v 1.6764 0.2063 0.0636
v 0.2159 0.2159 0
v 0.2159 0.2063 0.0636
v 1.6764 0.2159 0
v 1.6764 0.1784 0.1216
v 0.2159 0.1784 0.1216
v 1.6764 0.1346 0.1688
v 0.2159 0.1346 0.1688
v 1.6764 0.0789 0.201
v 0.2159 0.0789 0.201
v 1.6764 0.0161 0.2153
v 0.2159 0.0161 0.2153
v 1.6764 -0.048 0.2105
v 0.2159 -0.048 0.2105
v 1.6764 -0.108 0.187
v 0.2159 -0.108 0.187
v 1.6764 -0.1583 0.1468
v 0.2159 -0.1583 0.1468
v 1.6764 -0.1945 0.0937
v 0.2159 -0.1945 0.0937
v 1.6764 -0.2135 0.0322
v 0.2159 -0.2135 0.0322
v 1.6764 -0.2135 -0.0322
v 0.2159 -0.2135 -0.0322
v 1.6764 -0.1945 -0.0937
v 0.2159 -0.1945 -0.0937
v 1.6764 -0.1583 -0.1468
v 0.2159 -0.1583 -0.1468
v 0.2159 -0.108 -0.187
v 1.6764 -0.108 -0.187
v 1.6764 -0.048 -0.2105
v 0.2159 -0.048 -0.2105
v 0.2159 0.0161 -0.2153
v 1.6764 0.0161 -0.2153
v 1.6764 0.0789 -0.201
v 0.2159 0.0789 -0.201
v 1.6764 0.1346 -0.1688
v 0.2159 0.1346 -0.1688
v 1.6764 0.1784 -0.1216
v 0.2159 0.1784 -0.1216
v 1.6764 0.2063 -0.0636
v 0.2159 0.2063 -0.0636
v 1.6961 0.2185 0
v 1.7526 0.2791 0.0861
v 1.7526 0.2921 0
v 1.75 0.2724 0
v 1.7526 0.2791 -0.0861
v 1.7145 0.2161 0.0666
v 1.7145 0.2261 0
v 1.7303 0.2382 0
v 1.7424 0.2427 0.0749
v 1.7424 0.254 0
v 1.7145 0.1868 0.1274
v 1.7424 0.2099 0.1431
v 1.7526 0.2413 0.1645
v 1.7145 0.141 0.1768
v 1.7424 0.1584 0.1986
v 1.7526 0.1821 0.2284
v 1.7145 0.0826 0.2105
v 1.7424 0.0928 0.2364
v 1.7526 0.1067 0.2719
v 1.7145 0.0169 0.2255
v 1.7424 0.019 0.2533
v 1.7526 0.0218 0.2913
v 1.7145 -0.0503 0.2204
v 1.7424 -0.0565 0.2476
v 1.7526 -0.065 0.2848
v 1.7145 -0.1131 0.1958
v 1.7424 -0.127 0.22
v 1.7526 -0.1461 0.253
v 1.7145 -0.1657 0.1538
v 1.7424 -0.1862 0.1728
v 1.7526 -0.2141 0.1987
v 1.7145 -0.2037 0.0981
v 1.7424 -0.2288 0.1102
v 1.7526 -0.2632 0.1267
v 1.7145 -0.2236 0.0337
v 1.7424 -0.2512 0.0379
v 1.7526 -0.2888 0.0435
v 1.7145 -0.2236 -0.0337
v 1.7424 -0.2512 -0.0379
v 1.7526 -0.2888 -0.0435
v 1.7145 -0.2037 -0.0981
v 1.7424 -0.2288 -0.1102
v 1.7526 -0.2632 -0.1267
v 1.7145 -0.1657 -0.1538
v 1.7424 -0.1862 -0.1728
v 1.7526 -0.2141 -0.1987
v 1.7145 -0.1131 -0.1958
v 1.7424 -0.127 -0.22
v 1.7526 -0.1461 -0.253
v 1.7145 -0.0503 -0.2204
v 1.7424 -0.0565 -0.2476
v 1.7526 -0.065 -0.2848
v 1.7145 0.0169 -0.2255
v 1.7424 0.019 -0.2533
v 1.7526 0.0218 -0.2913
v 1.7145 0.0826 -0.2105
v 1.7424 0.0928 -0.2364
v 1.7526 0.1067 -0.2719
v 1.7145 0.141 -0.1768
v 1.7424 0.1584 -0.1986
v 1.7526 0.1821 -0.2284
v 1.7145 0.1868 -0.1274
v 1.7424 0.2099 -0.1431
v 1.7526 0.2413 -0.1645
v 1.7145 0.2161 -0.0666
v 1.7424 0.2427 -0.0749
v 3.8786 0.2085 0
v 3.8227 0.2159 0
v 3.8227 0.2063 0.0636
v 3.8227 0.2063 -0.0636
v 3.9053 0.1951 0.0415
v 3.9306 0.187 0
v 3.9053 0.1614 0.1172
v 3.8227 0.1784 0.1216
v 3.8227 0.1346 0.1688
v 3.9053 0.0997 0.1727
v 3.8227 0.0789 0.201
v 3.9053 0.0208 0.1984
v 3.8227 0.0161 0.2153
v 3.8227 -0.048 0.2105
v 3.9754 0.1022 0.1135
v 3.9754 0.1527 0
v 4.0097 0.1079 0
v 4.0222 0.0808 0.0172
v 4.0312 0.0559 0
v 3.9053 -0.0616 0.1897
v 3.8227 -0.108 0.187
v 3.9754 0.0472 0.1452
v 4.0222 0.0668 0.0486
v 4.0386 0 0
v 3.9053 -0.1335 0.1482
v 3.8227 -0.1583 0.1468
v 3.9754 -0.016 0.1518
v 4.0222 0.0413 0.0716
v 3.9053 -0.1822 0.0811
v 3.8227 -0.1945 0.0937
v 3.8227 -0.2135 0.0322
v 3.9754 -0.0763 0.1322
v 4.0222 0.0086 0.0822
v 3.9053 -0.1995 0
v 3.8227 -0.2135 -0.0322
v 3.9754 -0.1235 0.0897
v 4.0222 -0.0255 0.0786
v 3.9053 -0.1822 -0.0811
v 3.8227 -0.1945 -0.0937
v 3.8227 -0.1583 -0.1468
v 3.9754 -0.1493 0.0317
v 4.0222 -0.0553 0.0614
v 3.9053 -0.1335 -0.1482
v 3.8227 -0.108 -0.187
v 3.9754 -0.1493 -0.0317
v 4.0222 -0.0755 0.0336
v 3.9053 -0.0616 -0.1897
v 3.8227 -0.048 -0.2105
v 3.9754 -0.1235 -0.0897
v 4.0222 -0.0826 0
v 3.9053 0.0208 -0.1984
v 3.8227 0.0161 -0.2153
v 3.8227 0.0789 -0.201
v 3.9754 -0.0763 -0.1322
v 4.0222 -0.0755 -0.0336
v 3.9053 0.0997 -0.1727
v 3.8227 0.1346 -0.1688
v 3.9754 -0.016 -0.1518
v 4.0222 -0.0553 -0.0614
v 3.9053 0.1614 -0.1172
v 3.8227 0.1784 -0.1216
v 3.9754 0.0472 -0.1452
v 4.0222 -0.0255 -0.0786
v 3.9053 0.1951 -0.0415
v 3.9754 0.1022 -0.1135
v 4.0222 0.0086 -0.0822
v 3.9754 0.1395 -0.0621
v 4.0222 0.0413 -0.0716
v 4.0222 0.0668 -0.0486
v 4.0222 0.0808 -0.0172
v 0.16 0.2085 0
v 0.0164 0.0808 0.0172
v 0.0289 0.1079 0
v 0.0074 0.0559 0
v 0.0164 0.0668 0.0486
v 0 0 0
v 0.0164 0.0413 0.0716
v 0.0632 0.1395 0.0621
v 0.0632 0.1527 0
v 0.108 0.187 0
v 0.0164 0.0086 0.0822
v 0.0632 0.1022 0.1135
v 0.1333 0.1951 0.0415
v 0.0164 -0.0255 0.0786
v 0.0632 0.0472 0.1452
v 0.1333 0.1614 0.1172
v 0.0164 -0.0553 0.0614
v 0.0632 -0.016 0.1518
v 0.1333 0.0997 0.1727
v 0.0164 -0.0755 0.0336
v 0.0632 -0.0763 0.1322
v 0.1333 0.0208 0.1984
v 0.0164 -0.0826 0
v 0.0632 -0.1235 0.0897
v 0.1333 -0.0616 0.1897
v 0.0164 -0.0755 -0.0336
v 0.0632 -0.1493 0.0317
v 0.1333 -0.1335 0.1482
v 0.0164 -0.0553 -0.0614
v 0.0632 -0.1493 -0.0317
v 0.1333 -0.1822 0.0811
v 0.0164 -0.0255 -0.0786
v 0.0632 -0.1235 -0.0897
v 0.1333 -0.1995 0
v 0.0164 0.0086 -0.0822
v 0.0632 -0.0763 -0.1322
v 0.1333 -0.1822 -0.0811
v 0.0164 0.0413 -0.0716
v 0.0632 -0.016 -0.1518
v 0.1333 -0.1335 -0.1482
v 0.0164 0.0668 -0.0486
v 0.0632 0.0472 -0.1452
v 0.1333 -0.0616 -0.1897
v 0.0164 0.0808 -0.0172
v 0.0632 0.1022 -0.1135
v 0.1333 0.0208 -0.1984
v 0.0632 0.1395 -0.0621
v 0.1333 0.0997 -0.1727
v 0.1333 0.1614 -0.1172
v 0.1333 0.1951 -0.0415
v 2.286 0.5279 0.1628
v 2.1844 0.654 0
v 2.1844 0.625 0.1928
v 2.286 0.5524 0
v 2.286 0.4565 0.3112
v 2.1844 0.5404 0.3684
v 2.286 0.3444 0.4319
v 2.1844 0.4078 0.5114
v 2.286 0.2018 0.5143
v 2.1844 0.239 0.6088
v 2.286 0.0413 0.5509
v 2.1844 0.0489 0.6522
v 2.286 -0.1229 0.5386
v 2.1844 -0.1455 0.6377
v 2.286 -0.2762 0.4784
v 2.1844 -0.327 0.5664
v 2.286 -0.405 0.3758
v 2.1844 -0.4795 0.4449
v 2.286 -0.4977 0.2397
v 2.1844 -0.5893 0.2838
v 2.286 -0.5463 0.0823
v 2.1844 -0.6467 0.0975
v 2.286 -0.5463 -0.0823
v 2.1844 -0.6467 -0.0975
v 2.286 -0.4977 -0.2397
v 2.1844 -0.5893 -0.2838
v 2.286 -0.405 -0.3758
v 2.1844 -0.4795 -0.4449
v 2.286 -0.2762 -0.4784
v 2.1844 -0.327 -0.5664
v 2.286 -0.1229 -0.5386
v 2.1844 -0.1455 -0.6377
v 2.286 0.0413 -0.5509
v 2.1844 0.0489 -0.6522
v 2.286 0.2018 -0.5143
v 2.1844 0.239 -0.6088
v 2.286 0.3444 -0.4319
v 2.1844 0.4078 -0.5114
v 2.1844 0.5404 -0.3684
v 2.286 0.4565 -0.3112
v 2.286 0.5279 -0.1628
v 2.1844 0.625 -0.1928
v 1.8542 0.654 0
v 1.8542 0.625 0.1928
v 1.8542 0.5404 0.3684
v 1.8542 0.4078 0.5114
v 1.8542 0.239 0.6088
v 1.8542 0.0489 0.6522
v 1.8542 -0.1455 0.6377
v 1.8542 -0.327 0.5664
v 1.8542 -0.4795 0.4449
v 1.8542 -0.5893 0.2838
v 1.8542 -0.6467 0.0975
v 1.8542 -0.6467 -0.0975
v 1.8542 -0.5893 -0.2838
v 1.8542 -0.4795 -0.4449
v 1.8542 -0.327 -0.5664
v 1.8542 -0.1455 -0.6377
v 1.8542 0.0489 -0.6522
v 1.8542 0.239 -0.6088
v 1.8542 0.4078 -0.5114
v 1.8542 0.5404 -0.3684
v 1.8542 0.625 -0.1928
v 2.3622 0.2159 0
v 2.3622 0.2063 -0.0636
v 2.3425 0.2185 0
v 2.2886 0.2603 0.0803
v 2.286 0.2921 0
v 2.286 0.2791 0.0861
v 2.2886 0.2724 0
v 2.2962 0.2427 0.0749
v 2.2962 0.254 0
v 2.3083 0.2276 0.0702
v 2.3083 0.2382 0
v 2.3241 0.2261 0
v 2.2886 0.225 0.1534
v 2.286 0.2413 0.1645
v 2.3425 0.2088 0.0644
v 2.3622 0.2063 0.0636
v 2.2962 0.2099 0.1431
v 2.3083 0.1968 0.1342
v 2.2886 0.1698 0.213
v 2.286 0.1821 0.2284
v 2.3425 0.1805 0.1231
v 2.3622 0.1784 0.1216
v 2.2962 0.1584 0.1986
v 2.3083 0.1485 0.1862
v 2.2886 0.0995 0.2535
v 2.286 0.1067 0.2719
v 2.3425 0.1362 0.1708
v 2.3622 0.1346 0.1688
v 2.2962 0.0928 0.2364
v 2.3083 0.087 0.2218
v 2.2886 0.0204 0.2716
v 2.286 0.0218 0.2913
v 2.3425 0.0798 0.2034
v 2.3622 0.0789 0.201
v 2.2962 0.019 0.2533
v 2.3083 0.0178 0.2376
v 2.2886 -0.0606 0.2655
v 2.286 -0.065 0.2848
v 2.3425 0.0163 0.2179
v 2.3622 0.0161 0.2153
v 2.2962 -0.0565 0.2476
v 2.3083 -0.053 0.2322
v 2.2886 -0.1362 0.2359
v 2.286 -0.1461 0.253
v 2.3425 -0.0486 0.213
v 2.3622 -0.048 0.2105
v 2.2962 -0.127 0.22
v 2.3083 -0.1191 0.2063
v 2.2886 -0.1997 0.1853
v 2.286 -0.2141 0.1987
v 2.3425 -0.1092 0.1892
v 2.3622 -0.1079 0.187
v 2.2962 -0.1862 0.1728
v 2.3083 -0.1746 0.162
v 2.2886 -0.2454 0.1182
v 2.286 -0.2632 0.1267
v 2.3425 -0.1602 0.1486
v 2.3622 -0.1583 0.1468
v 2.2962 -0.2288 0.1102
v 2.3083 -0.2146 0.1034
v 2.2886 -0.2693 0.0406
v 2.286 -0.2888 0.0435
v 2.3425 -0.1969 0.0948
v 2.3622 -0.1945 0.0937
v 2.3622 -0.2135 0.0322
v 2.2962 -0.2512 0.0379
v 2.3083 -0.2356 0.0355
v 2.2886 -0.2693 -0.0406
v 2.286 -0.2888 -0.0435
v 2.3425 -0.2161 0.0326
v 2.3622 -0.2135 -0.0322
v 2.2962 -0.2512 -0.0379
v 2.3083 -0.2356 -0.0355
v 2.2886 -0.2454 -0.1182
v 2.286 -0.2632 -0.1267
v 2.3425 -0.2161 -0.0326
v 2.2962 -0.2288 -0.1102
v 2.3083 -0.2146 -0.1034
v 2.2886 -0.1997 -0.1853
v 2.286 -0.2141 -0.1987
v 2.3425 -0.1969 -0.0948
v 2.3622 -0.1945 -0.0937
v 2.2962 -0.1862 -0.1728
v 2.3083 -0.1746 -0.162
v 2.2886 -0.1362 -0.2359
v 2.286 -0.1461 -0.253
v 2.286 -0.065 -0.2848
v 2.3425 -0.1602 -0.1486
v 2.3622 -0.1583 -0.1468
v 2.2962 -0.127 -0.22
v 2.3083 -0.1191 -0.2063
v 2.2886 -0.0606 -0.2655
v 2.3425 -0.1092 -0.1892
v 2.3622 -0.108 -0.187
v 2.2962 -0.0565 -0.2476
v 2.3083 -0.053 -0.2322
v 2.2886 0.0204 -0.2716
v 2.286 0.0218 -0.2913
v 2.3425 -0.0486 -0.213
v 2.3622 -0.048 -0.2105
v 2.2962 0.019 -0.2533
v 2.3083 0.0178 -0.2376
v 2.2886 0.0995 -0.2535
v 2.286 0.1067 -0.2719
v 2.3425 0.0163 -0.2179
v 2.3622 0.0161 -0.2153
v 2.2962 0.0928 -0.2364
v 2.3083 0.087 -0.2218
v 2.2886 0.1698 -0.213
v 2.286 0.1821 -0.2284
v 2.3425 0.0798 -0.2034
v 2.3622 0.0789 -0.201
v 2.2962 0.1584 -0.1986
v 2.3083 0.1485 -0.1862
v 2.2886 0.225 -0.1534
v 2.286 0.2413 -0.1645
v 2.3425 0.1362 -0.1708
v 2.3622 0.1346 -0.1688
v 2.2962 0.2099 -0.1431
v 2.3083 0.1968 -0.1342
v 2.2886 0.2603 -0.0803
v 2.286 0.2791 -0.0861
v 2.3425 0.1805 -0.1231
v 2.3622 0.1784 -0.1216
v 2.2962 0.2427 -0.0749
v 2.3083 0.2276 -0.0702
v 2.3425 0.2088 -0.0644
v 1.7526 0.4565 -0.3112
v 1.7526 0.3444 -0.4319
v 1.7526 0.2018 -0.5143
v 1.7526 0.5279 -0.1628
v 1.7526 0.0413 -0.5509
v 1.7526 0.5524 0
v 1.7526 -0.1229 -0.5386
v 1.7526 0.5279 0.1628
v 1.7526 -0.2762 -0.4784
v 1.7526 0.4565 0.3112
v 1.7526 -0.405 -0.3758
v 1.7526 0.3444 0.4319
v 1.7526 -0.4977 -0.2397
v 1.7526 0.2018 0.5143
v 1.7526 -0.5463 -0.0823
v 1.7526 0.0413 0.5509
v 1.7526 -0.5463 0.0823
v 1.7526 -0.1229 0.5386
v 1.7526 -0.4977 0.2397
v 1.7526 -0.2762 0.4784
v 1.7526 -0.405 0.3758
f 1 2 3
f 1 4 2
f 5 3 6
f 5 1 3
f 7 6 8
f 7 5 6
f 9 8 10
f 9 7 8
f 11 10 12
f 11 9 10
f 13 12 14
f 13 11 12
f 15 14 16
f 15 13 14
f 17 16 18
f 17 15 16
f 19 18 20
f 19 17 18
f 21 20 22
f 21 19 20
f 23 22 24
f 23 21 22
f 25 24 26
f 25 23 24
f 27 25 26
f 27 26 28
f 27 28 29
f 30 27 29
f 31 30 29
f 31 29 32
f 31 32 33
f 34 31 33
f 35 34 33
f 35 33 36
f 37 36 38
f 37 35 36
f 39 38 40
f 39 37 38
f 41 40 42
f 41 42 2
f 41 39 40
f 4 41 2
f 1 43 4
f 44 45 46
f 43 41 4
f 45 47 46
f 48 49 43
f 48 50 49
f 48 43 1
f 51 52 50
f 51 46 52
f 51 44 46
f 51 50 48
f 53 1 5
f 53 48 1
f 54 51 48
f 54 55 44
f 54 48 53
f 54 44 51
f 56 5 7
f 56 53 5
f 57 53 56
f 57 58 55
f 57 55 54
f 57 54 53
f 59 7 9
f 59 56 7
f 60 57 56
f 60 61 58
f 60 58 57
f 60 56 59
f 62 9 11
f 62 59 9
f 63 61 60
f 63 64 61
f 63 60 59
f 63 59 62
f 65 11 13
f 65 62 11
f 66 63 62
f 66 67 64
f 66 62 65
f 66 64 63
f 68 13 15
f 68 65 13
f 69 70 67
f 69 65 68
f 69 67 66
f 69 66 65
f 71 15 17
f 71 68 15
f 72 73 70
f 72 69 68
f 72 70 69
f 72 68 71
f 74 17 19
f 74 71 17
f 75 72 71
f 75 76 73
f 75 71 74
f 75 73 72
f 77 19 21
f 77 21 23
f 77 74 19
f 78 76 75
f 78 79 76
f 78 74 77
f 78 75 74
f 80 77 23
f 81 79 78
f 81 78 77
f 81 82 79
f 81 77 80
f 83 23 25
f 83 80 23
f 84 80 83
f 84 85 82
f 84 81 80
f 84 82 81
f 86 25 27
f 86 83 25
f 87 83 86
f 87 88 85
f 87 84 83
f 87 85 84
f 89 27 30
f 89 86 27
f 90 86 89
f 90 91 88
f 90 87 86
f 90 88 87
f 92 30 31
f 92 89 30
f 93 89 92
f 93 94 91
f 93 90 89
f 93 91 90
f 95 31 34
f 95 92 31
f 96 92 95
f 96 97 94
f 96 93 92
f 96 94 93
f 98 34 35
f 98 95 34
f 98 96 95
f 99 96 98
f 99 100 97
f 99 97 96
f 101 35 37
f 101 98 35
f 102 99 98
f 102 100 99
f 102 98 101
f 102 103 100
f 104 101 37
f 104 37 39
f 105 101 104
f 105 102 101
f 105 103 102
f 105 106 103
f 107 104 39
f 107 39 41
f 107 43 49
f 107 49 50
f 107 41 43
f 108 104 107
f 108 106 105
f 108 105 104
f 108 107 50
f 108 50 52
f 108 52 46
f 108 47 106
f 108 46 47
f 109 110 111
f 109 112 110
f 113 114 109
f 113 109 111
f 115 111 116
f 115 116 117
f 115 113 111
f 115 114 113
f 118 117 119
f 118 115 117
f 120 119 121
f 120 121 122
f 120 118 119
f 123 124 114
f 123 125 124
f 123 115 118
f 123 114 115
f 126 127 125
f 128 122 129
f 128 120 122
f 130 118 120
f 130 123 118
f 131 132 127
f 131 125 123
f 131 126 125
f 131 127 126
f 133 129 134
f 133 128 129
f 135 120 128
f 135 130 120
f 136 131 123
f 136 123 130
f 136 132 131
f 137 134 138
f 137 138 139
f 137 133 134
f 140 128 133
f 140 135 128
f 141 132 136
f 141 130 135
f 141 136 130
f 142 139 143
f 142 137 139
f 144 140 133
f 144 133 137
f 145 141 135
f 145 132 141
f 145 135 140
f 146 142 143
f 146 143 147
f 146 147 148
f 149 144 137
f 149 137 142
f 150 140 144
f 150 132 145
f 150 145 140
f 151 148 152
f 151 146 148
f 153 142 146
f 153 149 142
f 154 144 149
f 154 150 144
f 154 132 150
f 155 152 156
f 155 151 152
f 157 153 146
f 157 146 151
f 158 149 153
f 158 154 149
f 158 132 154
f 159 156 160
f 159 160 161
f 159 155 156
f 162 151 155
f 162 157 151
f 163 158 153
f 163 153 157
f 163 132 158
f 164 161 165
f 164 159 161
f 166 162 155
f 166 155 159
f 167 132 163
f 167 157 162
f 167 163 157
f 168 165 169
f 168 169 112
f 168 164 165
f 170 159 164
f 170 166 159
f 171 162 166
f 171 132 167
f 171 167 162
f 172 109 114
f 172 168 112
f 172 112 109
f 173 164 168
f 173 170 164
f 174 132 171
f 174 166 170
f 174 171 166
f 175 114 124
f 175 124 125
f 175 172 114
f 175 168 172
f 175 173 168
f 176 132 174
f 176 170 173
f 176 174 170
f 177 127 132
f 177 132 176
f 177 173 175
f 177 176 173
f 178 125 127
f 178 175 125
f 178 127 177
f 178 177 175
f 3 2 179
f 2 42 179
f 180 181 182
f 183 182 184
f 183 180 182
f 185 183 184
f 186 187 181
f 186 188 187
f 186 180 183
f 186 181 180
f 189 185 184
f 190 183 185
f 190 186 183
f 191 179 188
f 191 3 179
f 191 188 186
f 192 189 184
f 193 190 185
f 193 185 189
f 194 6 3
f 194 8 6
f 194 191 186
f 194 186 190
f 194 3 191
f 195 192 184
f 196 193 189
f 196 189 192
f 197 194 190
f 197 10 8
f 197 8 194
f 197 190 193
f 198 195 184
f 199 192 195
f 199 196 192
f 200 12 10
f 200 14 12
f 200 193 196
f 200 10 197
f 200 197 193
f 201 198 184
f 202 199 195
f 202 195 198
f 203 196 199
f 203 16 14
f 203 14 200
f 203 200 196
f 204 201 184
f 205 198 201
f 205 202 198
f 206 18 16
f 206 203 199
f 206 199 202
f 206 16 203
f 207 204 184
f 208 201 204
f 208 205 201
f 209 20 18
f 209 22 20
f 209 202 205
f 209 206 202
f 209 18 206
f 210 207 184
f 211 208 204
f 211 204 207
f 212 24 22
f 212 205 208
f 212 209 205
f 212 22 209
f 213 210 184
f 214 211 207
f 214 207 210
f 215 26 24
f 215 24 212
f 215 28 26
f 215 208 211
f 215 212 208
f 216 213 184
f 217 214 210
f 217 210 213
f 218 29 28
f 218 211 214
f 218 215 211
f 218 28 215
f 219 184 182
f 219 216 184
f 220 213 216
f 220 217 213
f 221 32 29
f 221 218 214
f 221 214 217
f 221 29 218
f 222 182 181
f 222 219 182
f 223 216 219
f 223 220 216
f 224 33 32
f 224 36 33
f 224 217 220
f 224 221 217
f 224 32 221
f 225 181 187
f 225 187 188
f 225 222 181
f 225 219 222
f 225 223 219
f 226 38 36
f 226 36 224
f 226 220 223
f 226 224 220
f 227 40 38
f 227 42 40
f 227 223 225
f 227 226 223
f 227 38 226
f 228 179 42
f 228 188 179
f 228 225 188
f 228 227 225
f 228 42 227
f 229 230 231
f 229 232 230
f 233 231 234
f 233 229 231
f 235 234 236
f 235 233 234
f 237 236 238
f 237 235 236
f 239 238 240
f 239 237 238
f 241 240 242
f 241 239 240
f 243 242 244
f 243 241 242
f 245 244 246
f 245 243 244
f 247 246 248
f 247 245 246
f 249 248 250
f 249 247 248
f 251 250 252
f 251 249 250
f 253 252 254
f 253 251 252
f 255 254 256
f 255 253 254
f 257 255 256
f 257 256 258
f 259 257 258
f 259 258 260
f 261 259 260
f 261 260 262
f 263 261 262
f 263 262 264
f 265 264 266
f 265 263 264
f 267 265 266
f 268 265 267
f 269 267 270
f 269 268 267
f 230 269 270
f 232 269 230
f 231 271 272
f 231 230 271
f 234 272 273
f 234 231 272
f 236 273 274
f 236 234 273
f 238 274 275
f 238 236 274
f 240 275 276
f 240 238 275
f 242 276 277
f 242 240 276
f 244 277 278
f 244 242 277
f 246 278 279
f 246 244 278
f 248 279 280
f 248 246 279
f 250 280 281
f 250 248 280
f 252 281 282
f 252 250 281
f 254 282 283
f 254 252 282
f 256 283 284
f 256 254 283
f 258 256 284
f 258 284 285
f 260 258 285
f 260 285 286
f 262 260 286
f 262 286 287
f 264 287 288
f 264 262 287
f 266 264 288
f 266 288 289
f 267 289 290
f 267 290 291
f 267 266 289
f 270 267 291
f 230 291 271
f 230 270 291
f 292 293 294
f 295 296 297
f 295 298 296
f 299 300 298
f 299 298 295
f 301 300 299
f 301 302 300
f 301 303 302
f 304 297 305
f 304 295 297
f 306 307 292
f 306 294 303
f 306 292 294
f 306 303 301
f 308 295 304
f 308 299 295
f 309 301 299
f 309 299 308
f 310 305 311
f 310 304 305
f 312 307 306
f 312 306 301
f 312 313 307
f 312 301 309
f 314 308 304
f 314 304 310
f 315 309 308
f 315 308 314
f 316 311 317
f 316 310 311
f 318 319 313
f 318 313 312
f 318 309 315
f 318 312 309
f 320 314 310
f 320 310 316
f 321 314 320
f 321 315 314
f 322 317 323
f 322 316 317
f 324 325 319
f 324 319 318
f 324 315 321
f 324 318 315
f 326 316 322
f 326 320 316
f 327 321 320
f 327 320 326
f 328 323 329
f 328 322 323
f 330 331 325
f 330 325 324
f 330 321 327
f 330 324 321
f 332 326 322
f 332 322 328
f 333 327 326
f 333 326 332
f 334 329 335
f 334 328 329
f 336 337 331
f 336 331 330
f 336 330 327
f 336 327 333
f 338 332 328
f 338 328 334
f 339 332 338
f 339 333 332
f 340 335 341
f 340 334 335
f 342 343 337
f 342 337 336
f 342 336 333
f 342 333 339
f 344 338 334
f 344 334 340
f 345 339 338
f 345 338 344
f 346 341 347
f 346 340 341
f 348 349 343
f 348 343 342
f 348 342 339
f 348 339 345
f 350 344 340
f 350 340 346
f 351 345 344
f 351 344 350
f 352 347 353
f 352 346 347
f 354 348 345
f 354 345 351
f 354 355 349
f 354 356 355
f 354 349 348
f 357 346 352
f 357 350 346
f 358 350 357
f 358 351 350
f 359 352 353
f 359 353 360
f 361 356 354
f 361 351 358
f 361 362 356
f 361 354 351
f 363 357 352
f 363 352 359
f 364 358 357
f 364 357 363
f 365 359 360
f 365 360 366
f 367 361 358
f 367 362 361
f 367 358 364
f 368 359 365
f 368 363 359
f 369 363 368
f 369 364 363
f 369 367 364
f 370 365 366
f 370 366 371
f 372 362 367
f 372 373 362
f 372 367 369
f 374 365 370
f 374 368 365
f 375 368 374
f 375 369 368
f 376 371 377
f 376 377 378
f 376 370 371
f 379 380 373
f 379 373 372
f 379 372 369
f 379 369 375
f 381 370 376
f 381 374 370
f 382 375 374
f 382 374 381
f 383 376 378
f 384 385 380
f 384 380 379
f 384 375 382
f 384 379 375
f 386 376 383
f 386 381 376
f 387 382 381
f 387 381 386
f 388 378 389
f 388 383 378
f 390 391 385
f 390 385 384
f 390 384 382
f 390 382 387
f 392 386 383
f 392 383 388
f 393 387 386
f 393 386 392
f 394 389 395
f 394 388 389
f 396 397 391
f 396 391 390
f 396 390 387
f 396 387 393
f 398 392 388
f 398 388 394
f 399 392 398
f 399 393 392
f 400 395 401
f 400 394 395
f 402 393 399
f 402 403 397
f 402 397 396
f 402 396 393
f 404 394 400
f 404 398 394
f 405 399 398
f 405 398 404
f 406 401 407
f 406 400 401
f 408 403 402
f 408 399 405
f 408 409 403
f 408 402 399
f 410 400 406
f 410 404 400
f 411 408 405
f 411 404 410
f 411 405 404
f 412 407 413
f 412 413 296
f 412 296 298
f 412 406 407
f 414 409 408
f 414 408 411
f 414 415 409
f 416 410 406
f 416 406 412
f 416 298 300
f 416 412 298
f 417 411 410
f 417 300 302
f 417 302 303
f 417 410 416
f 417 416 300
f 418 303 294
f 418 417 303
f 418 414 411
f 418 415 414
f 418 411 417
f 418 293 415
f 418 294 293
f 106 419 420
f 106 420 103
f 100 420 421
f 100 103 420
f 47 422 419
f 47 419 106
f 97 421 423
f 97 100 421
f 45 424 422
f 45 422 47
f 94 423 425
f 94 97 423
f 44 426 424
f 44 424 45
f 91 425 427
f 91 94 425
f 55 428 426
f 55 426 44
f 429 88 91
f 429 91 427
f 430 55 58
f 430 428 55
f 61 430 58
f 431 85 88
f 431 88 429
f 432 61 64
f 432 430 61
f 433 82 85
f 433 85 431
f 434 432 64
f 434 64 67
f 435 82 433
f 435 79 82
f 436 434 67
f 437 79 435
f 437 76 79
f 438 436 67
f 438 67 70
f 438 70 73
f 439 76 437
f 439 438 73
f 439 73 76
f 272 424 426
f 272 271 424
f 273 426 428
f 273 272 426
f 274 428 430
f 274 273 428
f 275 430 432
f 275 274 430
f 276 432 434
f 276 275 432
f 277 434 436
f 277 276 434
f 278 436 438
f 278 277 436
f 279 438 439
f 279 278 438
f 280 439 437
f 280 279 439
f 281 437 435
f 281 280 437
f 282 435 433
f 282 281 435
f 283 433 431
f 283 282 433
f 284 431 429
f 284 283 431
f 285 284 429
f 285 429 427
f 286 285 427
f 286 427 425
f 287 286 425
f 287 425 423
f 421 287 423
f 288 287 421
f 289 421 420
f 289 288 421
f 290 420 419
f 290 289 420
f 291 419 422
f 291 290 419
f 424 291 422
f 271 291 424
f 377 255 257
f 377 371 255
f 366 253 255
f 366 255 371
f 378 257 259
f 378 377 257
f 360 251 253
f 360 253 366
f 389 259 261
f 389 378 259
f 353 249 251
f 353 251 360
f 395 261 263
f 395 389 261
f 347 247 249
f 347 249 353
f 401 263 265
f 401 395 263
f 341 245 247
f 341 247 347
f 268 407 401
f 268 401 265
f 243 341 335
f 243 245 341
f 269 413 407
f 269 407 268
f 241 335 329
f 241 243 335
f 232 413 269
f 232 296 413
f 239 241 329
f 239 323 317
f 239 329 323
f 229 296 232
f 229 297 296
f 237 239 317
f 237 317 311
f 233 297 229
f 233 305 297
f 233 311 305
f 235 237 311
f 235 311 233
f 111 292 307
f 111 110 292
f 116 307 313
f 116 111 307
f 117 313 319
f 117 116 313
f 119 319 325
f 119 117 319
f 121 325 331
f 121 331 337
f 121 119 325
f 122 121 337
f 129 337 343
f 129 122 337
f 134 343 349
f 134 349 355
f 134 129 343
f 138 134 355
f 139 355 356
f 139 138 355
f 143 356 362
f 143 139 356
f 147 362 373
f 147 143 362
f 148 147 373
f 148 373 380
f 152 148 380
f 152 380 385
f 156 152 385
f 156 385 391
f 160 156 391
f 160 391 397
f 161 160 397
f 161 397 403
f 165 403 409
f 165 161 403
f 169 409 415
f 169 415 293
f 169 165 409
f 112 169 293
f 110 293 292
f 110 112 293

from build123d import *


with BuildPart() as part:
    # Sketch1 → RevolutionAngle1 (revolve)
    with BuildSketch(Plane.XY):
        with BuildLine():
            Line((0.2159, 0.2159), (1.6764, 0.2159))
            ThreePointArc((1.6764, 0.2159), (1.730281537, 0.238218463), (1.7526, 0.2921))
            Line((1.7526, 0.2921), (1.7526, 0.55245))
            Line((1.7526, 0.55245), (1.8542, 0.65405))
            Line((1.8542, 0.65405), (2.1844, 0.65405))
            Line((2.1844, 0.65405), (2.286, 0.55245))
            Line((2.286, 0.55245), (2.286, 0.2921))
            ThreePointArc((2.286, 0.2921), (2.308318463, 0.238218463), (2.3622, 0.2159))
            Line((2.3622, 0.2159), (3.8227, 0.2159))
            ThreePointArc((3.8227, 0.2159), (3.975364354, 0.152664354), (4.0386, 0))
            Line((4.0386, 0), (0, 0))
            ThreePointArc((0, 0), (0.063235646, 0.152664354), (0.2159, 0.2159))
        make_face()
    revolve(axis=Axis((0, 0, 0), (1, 0, 0)))


solid = part.part
